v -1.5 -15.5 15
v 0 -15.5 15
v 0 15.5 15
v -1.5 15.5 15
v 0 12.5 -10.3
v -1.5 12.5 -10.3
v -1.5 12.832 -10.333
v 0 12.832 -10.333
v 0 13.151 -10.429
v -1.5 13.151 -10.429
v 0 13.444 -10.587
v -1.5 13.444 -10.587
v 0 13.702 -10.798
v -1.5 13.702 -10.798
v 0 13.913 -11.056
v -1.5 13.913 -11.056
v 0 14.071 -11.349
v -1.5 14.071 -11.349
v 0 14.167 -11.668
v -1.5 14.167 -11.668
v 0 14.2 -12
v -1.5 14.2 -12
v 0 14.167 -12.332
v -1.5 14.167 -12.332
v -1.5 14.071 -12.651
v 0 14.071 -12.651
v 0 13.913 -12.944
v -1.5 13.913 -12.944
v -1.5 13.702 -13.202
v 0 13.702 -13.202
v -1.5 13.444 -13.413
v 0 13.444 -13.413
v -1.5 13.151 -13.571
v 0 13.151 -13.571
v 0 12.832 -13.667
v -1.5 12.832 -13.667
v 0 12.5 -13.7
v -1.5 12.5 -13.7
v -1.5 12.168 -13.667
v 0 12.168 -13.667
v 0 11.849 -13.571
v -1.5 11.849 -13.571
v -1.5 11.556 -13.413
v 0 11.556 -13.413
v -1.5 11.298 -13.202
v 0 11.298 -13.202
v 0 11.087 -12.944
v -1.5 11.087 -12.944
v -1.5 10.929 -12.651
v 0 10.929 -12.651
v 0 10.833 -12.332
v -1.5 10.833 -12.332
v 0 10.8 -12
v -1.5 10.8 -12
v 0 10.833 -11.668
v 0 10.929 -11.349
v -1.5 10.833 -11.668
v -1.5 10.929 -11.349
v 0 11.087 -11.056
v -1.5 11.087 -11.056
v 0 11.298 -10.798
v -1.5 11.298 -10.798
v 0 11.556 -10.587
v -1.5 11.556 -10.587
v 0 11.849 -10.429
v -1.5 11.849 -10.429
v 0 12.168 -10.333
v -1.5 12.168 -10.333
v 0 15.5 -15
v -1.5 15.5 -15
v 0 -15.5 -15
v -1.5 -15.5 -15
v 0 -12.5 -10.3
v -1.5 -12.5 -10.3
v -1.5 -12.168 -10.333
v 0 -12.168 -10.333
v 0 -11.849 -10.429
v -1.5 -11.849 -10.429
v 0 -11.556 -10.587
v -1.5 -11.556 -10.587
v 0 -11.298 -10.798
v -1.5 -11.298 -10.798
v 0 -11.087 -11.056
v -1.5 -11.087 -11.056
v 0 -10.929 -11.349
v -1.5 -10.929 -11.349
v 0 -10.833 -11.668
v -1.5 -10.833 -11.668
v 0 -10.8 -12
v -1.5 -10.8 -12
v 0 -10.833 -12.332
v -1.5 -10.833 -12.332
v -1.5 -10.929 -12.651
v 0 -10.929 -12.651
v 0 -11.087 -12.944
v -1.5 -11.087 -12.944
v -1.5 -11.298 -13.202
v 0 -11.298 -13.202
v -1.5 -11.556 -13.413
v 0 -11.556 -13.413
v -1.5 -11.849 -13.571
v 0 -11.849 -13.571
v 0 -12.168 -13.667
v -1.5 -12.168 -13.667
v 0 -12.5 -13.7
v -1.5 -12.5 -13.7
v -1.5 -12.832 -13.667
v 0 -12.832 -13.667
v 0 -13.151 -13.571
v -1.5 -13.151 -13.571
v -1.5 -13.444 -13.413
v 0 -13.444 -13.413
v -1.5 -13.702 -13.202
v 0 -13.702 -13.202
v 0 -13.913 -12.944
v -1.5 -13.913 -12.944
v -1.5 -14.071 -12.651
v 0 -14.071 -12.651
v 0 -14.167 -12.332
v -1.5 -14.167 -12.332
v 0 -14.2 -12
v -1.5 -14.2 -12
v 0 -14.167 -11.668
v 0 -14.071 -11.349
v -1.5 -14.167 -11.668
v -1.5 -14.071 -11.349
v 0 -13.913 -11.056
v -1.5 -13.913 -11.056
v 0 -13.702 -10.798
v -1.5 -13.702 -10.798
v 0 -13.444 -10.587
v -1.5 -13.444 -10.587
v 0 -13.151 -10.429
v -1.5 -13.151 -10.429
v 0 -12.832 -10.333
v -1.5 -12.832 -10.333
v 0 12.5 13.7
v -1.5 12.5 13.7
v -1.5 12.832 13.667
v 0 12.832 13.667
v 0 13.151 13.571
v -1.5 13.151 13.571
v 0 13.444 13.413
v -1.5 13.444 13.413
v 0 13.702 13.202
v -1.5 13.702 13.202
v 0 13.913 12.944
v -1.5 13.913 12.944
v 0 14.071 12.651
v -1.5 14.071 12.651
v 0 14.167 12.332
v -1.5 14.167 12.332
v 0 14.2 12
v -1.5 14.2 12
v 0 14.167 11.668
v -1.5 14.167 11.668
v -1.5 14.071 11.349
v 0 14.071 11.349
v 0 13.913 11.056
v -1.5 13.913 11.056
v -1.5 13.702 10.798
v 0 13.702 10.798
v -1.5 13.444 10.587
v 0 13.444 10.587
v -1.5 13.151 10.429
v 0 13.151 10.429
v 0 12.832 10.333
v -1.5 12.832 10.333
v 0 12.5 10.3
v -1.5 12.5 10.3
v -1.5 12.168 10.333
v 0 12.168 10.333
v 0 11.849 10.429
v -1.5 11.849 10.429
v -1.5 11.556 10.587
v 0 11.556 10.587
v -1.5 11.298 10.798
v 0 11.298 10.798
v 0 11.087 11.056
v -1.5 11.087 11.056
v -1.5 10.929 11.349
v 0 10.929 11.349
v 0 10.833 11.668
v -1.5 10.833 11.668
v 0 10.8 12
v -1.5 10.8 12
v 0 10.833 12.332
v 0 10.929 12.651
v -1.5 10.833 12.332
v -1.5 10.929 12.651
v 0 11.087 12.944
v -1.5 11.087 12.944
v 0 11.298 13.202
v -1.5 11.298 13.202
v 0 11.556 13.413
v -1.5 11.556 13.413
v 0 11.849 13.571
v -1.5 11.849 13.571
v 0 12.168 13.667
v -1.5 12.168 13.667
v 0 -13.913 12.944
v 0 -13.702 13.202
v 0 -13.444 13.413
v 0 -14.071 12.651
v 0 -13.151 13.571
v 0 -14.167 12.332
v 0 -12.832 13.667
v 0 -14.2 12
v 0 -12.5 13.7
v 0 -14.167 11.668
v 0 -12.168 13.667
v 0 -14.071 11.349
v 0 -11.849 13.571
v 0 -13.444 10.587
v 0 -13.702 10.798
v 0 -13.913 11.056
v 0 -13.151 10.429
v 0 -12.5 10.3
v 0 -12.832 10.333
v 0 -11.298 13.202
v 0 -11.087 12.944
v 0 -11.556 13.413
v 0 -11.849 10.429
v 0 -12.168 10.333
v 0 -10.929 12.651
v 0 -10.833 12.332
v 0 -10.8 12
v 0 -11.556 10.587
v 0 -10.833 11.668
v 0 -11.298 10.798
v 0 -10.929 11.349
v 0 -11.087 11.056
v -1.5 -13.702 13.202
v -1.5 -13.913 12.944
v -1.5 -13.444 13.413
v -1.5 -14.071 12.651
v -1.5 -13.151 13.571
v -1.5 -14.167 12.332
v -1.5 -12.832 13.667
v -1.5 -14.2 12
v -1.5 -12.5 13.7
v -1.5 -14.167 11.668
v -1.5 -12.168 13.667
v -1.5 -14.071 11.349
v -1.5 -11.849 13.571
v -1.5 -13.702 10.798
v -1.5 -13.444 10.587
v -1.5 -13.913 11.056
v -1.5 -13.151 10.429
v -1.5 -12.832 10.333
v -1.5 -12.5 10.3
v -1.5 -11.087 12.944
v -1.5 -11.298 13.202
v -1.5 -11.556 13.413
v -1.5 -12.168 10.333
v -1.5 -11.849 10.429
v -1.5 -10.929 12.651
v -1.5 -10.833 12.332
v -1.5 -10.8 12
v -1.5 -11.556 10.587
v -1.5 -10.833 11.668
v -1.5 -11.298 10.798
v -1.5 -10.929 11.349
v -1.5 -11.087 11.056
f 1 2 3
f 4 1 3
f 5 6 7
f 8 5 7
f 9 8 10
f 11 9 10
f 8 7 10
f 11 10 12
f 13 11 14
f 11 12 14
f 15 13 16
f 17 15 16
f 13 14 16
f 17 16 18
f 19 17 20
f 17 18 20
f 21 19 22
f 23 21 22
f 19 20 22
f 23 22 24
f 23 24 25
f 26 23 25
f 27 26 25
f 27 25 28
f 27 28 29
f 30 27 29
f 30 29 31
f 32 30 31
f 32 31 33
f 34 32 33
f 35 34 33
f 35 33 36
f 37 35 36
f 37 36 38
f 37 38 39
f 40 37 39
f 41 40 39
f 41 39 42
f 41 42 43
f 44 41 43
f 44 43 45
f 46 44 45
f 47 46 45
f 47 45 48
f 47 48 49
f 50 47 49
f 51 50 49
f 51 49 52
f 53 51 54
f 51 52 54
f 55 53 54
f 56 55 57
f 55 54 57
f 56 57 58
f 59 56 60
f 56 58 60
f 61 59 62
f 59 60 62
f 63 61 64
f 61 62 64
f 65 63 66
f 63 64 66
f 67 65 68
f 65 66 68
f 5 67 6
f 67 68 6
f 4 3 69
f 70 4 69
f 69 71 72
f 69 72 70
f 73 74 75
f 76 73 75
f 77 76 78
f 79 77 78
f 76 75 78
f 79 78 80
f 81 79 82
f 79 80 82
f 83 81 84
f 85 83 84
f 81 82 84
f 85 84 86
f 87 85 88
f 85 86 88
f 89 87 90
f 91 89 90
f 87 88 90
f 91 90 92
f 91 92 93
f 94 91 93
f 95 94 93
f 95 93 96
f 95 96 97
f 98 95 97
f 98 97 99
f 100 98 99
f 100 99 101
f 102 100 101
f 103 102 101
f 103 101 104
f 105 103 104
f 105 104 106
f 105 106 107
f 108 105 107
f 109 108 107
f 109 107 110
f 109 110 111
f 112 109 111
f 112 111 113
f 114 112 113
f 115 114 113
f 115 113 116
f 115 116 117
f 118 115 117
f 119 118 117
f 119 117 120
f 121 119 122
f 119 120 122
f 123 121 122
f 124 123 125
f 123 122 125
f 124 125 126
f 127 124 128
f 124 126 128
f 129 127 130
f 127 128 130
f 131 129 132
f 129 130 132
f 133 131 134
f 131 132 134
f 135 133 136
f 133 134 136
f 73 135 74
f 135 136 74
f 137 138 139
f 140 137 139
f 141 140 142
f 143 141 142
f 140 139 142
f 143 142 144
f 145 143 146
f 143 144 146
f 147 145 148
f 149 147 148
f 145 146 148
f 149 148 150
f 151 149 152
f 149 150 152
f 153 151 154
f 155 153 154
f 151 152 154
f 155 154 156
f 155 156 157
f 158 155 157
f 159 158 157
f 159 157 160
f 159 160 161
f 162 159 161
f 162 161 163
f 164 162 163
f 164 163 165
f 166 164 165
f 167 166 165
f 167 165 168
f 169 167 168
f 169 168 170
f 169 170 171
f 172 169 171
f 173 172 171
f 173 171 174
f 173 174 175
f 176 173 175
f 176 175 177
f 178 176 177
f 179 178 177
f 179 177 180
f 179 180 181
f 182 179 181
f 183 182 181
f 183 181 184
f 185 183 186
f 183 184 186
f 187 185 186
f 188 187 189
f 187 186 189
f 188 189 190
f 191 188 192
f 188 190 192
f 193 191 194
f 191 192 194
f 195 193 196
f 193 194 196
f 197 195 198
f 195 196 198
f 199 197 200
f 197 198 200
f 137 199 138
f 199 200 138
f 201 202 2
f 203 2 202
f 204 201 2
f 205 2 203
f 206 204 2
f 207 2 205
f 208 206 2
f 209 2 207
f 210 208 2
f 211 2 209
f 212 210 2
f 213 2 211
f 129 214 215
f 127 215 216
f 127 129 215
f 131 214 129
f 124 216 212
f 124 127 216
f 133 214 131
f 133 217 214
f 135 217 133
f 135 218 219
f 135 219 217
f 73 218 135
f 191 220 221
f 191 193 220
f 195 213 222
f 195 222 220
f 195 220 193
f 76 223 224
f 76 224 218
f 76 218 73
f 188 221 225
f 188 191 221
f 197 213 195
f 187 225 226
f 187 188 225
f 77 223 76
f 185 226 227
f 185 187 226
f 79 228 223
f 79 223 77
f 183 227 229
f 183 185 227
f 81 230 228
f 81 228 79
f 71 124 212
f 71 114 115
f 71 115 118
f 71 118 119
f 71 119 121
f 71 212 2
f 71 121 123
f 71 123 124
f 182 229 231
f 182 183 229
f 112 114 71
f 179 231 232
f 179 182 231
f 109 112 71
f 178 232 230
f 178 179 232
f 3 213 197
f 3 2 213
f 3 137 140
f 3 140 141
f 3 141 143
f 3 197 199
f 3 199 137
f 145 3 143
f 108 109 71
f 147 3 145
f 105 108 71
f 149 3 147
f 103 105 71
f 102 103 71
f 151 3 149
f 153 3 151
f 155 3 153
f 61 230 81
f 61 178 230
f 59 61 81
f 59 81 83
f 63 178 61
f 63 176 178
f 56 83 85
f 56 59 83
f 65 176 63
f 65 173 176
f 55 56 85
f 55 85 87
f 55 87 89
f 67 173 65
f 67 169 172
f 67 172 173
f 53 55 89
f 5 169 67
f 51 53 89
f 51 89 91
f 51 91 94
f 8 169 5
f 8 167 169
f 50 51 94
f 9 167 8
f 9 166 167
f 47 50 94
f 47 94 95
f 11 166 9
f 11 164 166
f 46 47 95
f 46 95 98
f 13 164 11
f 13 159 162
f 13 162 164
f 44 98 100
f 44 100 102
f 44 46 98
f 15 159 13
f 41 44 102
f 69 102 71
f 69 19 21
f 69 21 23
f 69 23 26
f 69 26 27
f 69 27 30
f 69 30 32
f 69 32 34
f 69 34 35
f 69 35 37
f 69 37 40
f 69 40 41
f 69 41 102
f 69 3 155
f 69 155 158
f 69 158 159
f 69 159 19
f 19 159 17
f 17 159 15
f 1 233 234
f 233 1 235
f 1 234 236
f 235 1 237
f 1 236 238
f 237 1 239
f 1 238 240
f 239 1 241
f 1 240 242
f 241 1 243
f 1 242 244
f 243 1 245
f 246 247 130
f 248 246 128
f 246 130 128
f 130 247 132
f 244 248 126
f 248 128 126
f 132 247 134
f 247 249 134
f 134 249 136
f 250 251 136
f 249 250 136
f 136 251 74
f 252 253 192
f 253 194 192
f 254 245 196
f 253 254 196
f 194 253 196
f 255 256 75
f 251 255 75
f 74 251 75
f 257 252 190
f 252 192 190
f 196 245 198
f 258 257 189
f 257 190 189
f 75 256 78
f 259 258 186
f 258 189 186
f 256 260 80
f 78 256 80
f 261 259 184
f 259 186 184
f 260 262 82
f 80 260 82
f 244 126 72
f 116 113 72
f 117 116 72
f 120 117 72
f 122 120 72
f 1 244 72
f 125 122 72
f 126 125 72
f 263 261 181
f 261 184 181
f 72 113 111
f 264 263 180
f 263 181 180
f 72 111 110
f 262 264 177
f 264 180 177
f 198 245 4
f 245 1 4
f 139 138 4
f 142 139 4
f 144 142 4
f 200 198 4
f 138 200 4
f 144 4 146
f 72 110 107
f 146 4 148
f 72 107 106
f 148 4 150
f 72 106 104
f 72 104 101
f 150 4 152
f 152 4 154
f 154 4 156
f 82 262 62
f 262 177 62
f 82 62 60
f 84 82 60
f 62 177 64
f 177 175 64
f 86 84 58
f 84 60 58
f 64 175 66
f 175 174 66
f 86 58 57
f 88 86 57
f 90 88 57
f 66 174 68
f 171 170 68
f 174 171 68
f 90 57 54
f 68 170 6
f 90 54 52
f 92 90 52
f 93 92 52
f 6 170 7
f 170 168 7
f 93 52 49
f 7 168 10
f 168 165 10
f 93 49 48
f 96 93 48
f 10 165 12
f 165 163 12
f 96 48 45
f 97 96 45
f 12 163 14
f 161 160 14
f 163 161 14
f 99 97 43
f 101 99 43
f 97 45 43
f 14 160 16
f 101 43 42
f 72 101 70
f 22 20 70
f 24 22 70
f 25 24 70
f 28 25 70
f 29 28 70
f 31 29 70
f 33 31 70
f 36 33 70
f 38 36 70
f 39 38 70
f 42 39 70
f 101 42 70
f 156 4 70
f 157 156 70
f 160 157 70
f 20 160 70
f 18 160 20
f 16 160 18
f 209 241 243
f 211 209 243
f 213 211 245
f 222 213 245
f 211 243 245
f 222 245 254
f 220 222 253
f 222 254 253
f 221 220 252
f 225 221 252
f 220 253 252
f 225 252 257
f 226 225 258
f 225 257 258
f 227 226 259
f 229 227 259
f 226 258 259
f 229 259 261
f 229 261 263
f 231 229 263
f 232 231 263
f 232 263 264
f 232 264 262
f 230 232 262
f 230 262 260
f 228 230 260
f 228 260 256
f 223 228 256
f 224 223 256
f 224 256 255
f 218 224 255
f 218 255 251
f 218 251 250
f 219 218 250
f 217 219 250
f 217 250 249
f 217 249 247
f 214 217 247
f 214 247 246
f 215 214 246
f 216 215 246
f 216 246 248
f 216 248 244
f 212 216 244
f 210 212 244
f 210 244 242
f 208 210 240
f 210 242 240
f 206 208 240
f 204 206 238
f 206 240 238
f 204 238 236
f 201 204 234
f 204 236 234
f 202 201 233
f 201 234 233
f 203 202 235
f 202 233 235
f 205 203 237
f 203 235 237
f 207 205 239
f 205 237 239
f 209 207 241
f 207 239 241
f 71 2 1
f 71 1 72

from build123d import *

# Parameters (mm, degrees)
SKETCH_1_W             = 30
SKETCH_1_H             = 31
SM_BASE_FLANGE_1_DEPTH = 1.5
HOLE_WIZARD_M3_1_D     = 3.4
HOLE_WIZARD_M3_1_DEPTH = 20
HOLE_WIZARD_M3_1_TIP   = 1.021463052


# Sheet-metal steps are written as plain solids
with BuildPart() as part:
    # Sketch 1 → 基体-法兰1 (new body)
    with BuildSketch(Plane(origin=(0, 0, 0), x_dir=(0, 0, -1), z_dir=(1, 0, 0))):
        Rectangle(SKETCH_1_W, SKETCH_1_H)
    extrude(amount=-SM_BASE_FLANGE_1_DEPTH)

    # M3 间隙孔1
    with Locations(Plane(origin=(0, 0, 0), x_dir=(0, 0, -1), z_dir=(1, 0, 0))):
        with Locations((-12, 12.5), (12, 12.5), (12, -12.5), (-12, -12.5)):
            Hole(HOLE_WIZARD_M3_1_D / 2, depth=HOLE_WIZARD_M3_1_DEPTH)
            with Locations((0, 0, -(HOLE_WIZARD_M3_1_DEPTH + HOLE_WIZARD_M3_1_TIP / 2))):  # 118° drill point
                Cone(0, HOLE_WIZARD_M3_1_D / 2, HOLE_WIZARD_M3_1_TIP, mode=Mode.SUBTRACT)


solid = part.part
